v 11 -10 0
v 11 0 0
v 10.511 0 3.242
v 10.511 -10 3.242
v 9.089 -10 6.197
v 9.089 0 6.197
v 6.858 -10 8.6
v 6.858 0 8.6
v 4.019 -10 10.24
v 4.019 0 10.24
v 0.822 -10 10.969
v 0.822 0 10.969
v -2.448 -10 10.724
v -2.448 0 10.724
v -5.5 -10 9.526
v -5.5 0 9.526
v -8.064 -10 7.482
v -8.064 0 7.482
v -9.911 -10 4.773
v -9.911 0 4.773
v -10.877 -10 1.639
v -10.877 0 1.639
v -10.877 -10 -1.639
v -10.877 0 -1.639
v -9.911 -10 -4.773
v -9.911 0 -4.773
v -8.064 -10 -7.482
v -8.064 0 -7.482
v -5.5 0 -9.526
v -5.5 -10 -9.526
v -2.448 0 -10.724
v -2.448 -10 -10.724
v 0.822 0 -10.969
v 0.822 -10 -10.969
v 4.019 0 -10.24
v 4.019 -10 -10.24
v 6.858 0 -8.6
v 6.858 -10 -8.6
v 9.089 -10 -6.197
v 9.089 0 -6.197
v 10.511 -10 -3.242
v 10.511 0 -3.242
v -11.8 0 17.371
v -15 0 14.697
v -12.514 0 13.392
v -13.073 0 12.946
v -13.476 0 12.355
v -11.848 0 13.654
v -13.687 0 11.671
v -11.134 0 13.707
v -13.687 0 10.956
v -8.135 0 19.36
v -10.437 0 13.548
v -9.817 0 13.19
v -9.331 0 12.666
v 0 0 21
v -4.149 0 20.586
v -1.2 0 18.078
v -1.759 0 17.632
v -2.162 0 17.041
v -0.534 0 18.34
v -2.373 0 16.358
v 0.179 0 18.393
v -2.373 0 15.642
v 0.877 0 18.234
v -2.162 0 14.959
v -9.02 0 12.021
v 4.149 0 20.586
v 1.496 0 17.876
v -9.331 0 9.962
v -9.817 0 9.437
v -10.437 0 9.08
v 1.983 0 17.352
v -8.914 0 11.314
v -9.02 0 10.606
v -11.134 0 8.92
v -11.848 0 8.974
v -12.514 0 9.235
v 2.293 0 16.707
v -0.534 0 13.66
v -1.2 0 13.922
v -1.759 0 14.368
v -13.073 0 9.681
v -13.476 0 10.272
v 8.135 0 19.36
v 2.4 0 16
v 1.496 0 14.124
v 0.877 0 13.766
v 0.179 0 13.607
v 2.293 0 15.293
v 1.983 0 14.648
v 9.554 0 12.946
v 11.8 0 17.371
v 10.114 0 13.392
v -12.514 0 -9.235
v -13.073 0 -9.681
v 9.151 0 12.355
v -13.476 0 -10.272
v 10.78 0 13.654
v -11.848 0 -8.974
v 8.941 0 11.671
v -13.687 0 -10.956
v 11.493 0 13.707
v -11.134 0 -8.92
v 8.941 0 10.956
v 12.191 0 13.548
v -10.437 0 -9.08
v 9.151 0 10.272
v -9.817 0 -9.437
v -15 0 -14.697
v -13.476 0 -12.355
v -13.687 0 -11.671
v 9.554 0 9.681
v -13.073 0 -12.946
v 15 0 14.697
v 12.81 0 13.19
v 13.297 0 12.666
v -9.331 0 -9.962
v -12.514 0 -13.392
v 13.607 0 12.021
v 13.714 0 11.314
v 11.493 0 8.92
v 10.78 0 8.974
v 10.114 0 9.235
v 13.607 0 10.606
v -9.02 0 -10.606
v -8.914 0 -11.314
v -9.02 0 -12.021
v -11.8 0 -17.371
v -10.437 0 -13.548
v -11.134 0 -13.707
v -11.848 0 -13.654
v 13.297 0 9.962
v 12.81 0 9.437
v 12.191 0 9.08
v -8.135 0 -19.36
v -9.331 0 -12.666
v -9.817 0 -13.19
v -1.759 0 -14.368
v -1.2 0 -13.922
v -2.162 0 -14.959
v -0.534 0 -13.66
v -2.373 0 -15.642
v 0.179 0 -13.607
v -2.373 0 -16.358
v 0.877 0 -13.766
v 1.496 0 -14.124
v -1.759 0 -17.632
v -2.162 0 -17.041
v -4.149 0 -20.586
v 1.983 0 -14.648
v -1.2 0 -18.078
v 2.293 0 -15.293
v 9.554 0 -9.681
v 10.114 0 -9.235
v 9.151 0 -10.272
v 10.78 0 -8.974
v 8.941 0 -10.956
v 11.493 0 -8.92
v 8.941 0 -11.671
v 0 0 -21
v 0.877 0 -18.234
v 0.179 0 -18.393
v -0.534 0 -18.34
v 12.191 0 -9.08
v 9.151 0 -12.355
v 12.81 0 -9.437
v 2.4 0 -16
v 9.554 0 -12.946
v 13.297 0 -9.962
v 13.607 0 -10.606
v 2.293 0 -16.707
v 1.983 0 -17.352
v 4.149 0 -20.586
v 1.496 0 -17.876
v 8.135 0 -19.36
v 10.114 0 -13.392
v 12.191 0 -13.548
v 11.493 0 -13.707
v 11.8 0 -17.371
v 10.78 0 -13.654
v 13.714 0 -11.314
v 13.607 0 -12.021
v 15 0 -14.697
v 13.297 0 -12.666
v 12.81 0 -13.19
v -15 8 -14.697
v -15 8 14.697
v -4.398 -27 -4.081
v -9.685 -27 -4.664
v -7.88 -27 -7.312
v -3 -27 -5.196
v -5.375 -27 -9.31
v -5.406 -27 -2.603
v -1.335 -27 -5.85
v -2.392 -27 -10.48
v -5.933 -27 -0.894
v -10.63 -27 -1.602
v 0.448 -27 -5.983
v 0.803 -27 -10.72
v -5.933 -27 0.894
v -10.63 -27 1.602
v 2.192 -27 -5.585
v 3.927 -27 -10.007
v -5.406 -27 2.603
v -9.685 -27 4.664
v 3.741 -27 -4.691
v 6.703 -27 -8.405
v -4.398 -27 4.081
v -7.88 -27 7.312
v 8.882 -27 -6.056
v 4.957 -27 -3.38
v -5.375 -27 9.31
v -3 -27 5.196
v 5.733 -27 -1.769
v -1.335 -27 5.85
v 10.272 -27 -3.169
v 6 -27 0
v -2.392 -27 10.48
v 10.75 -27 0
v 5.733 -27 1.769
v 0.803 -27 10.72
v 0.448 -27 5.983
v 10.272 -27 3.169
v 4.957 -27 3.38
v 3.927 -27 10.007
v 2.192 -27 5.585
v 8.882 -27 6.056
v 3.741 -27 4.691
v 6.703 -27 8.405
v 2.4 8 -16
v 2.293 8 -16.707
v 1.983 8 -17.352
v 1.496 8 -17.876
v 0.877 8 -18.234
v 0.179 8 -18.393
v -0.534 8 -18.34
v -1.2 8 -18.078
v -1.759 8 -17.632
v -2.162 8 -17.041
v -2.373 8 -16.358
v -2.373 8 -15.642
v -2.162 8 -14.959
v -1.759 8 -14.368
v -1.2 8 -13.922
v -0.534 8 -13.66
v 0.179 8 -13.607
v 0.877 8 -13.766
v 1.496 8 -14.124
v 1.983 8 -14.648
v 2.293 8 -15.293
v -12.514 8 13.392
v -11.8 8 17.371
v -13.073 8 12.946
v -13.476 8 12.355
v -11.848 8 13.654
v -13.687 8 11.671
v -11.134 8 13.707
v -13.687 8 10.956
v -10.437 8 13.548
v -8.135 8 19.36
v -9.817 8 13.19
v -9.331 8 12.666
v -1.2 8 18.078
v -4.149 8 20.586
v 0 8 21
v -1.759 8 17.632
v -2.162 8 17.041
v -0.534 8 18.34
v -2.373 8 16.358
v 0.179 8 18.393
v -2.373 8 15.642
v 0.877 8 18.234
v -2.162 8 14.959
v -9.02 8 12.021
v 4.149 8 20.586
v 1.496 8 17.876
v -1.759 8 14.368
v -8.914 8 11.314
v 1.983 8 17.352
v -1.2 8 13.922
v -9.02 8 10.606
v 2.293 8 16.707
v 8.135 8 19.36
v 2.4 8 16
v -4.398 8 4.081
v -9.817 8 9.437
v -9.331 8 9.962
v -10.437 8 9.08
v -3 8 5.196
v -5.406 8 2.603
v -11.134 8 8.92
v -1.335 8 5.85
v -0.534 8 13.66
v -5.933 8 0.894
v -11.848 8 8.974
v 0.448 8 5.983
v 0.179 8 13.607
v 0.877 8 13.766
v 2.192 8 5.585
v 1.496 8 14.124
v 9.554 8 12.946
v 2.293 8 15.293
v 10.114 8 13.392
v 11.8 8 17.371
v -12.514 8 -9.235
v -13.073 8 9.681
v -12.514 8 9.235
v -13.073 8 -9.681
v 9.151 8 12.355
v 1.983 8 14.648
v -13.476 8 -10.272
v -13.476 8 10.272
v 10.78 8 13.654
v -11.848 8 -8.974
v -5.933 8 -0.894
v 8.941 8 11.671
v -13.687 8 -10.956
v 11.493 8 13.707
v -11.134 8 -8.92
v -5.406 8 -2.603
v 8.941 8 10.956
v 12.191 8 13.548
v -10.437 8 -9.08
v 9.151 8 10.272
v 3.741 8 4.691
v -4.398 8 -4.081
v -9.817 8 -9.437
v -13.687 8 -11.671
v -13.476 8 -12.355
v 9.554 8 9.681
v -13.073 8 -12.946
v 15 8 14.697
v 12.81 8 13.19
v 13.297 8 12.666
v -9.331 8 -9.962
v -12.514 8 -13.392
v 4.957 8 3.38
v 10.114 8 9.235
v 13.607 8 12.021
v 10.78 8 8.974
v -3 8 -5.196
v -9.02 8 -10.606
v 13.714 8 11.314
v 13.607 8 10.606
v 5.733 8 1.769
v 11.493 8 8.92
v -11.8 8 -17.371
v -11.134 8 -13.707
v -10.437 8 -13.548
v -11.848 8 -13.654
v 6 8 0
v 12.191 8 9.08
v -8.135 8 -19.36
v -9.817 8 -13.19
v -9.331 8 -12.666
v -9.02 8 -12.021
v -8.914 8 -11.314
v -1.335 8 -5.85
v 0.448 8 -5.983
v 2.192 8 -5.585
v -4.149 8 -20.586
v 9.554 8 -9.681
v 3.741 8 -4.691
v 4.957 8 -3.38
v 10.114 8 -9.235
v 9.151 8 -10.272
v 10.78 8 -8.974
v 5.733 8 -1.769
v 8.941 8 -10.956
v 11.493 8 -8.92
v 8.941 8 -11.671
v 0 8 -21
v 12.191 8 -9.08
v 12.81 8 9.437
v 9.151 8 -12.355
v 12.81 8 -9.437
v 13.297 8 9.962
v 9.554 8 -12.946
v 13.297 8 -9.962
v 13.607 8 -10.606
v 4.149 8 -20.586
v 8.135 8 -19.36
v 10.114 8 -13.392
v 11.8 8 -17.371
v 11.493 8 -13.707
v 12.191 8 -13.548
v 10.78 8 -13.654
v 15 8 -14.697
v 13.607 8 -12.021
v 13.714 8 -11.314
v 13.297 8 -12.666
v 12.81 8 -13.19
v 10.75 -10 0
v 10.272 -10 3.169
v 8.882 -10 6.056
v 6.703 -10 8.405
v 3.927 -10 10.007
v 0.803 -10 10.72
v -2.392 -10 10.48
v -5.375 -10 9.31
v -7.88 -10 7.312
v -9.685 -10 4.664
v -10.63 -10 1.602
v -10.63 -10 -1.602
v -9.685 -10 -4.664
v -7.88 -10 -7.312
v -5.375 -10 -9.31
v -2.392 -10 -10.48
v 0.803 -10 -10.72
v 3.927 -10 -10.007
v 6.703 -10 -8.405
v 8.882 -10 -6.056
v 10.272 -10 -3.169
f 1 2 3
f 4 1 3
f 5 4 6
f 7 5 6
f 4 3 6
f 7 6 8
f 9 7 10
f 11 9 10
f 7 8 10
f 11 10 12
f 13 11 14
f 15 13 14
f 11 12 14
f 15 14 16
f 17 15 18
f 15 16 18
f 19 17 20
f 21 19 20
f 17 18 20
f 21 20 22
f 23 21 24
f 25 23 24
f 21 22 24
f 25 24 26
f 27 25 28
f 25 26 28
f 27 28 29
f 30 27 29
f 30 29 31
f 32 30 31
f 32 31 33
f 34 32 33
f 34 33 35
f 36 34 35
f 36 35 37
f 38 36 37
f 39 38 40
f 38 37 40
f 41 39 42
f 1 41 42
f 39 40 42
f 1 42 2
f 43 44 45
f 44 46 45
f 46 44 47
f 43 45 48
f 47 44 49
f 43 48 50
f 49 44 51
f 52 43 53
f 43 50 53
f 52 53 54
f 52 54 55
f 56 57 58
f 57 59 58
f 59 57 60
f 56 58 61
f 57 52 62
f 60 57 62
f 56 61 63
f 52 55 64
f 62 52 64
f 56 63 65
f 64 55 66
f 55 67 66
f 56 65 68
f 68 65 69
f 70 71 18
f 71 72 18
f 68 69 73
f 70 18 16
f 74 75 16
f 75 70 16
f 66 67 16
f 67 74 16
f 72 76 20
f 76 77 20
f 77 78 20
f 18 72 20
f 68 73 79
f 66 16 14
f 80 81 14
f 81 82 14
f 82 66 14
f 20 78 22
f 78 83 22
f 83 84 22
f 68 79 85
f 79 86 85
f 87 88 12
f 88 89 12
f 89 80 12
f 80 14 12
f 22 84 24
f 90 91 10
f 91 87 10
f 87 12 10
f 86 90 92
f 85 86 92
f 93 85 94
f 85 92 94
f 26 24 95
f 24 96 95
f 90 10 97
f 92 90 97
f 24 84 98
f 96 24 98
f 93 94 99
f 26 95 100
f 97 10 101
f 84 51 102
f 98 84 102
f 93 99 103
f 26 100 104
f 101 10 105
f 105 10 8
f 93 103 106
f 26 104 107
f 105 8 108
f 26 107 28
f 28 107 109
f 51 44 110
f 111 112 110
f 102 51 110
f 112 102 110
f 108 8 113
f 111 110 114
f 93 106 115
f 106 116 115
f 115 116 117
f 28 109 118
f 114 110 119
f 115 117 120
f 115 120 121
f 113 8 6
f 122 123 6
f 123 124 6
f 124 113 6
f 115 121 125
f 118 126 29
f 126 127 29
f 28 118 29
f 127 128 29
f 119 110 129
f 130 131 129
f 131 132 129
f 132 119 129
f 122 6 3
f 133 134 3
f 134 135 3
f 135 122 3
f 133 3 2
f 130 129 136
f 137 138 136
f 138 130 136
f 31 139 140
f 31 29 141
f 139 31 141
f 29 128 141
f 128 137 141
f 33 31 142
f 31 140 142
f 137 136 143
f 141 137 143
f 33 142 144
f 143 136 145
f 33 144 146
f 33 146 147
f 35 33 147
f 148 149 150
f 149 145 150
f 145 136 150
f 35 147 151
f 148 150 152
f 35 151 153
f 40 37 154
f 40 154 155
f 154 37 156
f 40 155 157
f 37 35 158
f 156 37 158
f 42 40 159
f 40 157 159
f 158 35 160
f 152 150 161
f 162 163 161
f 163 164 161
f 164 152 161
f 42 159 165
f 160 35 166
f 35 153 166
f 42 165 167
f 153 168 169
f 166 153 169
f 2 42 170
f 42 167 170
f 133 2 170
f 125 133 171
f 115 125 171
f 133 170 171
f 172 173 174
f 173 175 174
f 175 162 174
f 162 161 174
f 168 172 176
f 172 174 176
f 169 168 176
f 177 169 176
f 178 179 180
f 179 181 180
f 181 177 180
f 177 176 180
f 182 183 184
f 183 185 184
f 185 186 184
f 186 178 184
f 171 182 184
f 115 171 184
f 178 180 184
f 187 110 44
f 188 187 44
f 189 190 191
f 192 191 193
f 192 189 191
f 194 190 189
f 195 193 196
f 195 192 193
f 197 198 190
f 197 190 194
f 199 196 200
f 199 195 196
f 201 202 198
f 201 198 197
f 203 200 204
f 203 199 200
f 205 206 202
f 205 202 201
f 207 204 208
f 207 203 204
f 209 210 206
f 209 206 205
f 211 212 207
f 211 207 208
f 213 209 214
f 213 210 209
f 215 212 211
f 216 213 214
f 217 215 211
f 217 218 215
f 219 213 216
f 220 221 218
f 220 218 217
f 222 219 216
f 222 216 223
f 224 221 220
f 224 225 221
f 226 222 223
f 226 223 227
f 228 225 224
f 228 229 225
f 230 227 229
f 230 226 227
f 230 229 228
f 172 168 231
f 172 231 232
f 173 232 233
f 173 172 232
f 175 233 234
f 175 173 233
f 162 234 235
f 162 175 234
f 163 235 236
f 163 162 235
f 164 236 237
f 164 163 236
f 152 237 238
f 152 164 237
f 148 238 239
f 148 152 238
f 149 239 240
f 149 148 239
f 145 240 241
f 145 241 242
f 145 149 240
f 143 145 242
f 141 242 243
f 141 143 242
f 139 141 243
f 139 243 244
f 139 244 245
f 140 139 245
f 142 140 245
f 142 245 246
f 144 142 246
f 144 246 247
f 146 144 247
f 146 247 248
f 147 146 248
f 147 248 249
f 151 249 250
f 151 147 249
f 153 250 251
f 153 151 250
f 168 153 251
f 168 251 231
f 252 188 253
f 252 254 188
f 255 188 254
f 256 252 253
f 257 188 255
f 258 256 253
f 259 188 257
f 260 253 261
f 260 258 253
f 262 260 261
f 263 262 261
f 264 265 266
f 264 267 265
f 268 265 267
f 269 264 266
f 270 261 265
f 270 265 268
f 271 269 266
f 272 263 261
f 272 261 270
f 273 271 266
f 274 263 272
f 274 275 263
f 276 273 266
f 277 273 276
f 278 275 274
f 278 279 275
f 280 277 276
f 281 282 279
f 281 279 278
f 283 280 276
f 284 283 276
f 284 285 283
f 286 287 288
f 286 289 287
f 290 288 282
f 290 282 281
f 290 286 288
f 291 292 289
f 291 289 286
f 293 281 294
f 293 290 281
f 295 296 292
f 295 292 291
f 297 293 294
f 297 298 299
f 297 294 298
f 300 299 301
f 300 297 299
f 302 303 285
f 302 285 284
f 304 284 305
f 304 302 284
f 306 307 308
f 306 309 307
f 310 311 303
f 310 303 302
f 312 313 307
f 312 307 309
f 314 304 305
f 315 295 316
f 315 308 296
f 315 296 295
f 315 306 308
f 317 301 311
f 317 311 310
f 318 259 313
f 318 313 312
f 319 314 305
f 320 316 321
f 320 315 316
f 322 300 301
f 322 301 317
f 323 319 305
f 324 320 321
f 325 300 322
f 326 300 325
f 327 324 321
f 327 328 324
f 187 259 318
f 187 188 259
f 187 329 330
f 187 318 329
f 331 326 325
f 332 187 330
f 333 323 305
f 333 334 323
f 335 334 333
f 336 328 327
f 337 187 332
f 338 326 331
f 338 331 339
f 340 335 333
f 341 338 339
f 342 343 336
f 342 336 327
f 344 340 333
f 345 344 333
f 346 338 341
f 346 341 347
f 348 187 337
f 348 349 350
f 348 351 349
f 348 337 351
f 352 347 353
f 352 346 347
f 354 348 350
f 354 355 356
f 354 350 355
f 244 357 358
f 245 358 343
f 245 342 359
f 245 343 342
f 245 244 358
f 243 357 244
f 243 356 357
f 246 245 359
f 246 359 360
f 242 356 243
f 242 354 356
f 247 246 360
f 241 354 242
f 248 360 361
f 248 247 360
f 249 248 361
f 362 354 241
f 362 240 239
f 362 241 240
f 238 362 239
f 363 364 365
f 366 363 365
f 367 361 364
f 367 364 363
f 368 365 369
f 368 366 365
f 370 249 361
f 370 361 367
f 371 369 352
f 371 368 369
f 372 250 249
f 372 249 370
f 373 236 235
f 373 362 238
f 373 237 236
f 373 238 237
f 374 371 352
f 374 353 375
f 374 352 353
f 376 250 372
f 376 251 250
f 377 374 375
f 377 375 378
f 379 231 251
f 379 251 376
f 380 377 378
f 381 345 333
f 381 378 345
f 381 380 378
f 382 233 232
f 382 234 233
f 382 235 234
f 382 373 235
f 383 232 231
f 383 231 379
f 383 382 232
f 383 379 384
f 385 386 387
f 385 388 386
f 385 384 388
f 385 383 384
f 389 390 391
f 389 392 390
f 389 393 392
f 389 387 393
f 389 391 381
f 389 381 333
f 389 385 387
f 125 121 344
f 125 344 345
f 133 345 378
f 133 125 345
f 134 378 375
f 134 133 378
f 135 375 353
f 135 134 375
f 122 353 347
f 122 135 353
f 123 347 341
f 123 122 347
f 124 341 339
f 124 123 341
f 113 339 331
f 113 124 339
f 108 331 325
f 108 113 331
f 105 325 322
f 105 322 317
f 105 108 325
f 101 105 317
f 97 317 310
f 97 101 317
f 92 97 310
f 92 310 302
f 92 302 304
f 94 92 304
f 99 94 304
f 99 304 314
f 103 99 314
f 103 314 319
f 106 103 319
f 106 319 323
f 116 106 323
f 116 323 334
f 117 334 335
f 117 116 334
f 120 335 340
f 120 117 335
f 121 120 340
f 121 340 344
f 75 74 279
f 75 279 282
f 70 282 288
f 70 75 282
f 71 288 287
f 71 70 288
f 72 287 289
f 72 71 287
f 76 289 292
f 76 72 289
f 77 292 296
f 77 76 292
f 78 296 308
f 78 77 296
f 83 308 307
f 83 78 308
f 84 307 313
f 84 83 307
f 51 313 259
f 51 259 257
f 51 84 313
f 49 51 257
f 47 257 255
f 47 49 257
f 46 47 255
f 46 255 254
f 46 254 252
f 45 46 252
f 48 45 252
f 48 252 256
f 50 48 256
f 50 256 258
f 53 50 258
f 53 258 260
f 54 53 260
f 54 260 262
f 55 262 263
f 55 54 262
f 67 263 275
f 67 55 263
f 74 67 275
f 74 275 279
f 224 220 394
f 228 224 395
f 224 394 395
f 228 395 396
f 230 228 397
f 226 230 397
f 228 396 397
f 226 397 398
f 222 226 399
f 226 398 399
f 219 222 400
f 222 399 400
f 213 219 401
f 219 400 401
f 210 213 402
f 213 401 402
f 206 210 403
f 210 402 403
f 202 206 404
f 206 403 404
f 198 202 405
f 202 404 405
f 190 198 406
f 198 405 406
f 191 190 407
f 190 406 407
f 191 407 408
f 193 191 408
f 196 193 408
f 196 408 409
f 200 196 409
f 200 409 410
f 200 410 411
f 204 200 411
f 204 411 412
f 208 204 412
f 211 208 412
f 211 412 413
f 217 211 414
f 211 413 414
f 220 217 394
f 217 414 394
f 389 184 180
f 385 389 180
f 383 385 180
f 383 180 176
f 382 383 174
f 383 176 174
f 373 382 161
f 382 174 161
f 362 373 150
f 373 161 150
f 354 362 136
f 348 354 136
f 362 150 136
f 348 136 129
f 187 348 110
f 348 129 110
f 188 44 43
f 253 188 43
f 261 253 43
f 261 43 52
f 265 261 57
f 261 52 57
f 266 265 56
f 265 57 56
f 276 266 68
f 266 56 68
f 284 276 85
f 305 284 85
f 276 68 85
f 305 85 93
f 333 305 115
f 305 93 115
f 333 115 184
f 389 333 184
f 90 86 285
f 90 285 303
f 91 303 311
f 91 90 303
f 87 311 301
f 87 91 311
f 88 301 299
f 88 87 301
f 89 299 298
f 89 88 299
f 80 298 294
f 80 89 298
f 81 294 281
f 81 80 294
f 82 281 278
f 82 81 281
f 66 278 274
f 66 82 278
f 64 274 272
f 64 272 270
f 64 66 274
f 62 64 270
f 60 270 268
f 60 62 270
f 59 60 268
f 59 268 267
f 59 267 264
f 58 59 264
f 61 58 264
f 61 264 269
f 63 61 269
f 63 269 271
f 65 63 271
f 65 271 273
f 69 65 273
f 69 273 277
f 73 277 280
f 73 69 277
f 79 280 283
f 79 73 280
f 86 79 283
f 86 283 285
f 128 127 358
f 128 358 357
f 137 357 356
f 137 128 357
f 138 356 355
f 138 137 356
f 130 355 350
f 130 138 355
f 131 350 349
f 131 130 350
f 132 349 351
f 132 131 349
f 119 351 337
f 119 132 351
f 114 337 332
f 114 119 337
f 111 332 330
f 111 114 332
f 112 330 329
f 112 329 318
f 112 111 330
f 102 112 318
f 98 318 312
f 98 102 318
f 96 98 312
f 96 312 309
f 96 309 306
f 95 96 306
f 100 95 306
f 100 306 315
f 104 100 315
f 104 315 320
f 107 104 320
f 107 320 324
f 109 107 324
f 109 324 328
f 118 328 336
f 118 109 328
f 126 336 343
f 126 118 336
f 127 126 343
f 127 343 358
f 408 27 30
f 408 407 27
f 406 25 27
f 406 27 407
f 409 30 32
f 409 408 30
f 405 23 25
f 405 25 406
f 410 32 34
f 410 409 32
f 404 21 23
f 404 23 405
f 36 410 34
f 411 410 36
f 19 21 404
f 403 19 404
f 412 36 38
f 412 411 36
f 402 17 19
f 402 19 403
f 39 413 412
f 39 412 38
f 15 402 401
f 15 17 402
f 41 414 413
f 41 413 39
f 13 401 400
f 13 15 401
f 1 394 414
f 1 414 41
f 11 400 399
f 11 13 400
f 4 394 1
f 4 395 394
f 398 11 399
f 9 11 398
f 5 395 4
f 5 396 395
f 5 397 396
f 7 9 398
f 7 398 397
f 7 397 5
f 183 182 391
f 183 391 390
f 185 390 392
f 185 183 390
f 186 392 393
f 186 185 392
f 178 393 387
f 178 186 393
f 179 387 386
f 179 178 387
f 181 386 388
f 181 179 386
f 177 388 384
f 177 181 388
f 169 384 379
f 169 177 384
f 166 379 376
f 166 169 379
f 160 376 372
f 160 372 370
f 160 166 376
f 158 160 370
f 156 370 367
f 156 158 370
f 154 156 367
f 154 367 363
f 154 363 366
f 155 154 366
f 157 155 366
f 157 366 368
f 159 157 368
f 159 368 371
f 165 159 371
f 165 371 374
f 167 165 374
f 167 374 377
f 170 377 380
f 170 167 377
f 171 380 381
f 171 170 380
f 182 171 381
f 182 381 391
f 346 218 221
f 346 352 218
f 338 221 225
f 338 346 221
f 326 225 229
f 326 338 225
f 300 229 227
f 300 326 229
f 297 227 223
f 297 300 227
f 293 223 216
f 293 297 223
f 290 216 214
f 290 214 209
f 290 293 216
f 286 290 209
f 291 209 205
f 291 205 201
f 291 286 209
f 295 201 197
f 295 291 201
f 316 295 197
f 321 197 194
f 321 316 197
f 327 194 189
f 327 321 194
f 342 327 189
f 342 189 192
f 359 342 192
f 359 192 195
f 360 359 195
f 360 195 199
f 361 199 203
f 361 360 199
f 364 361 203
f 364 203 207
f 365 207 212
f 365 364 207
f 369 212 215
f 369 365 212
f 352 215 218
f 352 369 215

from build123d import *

# Parameters (mm, degrees)
SKETCH1_R           = 6
SKETCH1_R_2         = 2.4
BOSS_EXTRUDE1_DEPTH = 8
SKETCH2_R           = 11
SKETCH2_R_2         = 6
BOSS_EXTRUDE2_DEPTH = 10
SKETCH3_R           = 10.75
SKETCH3_R_2         = 6
BOSS_EXTRUDE3_DEPTH = 17


with BuildPart() as part:
    # Sketch1 → Boss-Extrude1 (new body)
    with BuildSketch(Plane(origin=(0, 0, 0), x_dir=(1, 0, 0), z_dir=(0, 1, 0))):
        with BuildLine():
            Line((-15, 14.696938457), (-15, -14.696938457))
            ThreePointArc((-15, -14.696938457), (0, -21), (15, -14.696938457))
            Line((15, -14.696938457), (15, 14.696938457))
            ThreePointArc((15, 14.696938457), (0, 21), (-15, 14.696938457))
        make_face()
        Circle(SKETCH1_R, mode=Mode.SUBTRACT)
        with Locations((0, 16)):
            Circle(SKETCH1_R_2, mode=Mode.SUBTRACT)
        with Locations((11.313708499, 11.313708499)):
            Circle(SKETCH1_R_2, mode=Mode.SUBTRACT)
        with Locations((-11.313708499, 11.313708499)):
            Circle(SKETCH1_R_2, mode=Mode.SUBTRACT)
        with Locations((11.313708499, -11.313708499)):
            Circle(SKETCH1_R_2, mode=Mode.SUBTRACT)
        with Locations((0, -16)):
            Circle(SKETCH1_R_2, mode=Mode.SUBTRACT)
        with Locations((-11.313708499, -11.313708499)):
            Circle(SKETCH1_R_2, mode=Mode.SUBTRACT)
    extrude(amount=BOSS_EXTRUDE1_DEPTH)

    # Sketch2 → Boss-Extrude2 (add)
    with BuildSketch(Plane.XZ):
        Circle(SKETCH2_R)
        Circle(SKETCH2_R_2, mode=Mode.SUBTRACT)
    extrude(amount=BOSS_EXTRUDE2_DEPTH)

    # Sketch3 → Boss-Extrude3 (add)
    with BuildSketch(Plane.XZ.offset(10)):
        Circle(SKETCH3_R)
        Circle(SKETCH3_R_2, mode=Mode.SUBTRACT)
    extrude(amount=BOSS_EXTRUDE3_DEPTH)


solid = part.part
